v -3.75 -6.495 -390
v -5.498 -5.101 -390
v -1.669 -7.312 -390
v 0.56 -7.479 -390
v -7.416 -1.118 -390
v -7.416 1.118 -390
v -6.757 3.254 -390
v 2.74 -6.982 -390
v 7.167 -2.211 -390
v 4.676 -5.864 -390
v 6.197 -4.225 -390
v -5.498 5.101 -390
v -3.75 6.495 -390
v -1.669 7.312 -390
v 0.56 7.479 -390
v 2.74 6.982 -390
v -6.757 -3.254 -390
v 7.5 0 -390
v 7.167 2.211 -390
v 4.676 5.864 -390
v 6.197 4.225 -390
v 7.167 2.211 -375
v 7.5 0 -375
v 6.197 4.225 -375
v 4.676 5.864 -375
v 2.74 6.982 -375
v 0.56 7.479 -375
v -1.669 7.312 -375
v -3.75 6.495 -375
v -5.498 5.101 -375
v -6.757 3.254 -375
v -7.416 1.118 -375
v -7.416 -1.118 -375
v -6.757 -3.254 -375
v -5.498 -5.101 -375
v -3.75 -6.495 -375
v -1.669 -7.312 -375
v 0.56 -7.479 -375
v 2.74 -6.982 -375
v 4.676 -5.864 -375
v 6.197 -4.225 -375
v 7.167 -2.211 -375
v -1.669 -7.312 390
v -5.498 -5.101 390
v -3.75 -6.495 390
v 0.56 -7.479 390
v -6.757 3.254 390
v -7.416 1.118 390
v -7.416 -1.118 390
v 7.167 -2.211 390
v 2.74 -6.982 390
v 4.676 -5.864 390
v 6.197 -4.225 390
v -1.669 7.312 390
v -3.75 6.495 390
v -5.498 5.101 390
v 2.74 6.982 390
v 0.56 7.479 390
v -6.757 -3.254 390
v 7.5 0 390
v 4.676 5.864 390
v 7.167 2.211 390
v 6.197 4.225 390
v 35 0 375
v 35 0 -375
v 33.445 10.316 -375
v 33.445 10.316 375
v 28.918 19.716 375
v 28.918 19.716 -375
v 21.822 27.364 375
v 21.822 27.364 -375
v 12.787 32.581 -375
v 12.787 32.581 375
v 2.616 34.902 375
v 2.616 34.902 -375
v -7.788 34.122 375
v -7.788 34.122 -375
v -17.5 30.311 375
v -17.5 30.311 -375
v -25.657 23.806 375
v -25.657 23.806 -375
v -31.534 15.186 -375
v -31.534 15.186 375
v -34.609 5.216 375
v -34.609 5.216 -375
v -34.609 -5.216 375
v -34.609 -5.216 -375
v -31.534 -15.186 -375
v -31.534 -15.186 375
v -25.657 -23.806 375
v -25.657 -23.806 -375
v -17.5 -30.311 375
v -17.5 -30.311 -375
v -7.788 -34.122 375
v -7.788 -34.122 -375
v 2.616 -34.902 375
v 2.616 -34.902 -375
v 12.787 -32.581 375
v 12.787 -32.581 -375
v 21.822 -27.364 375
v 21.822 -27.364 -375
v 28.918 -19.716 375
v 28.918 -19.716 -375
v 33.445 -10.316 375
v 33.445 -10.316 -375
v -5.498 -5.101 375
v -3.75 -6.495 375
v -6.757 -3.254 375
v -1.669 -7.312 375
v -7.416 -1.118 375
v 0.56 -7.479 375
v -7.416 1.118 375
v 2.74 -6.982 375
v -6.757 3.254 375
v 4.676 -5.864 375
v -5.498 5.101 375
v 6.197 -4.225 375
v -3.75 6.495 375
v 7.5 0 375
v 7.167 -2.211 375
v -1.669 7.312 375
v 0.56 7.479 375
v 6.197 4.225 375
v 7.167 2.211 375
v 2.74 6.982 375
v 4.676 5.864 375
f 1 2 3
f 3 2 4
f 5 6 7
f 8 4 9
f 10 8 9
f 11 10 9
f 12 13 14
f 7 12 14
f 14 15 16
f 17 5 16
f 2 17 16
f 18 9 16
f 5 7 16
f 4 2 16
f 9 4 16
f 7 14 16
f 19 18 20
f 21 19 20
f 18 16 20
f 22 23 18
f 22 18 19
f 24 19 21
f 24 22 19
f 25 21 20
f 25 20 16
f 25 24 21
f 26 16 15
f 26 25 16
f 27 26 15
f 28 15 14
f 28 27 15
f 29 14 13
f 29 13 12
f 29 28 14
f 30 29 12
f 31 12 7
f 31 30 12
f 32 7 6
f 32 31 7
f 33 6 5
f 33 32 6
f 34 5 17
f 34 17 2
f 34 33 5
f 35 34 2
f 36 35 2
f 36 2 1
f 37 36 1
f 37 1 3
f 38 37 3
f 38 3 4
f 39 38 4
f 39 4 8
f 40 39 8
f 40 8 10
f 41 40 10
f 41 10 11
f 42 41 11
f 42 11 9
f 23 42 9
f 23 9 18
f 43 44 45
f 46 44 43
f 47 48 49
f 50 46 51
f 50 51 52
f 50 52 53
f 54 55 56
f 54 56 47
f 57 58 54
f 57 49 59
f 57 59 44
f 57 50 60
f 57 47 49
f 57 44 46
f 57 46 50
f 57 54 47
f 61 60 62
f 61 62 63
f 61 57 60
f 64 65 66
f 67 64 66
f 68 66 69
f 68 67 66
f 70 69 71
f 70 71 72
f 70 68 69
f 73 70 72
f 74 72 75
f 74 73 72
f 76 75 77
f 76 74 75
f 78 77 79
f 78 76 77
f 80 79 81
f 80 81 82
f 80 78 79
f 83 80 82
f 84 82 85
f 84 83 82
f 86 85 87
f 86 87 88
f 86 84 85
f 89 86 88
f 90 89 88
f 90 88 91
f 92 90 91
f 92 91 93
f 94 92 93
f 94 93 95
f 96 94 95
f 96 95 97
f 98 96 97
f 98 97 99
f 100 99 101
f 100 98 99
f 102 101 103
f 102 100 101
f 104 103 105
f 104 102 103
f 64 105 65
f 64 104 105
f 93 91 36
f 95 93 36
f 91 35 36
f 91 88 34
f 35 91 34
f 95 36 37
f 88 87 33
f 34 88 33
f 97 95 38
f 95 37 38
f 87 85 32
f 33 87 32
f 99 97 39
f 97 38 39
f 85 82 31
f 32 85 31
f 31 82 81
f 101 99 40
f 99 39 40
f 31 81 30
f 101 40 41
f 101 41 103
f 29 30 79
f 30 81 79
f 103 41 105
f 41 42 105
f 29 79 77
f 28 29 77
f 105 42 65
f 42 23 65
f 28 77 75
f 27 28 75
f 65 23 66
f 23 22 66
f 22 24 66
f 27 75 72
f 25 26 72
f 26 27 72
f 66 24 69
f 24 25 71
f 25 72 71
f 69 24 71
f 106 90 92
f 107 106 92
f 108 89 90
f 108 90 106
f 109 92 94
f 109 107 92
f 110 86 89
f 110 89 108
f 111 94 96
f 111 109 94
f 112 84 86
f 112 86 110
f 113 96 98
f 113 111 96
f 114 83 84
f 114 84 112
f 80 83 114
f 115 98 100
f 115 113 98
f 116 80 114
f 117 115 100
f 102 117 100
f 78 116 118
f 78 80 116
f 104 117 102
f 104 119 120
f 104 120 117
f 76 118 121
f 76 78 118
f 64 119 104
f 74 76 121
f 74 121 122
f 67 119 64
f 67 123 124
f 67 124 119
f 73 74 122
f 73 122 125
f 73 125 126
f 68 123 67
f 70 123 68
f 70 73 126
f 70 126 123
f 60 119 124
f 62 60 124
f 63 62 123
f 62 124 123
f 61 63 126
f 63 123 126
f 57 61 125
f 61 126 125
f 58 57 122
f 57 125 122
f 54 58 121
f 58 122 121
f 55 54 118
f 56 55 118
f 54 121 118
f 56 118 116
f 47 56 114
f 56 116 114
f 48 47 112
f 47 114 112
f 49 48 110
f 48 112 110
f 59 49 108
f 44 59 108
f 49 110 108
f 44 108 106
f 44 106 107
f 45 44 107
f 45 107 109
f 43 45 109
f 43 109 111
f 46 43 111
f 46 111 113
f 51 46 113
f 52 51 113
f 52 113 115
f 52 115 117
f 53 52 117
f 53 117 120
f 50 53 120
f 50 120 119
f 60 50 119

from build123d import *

# Parameters (mm, degrees)
CYLINDER_R        = 35
CYLINDER_DEPTH    = 375
CYLINDER001_R     = 7.5
CYLINDER001_DEPTH = 390


with BuildPart() as part:
    # Cylinder → Cylinder (join)
    with BuildSketch(Plane.XY):
        Circle(CYLINDER_R)
    cylinder = extrude(amount=CYLINDER_DEPTH)

    # Cylinder001 → Cylinder001 (join)
    with BuildSketch(Plane.XY):
        Circle(CYLINDER001_R)
    cylinder001 = extrude(amount=CYLINDER001_DEPTH)

    # Mirrored001: Cylinder, Cylinder001 across XY
    add(cylinder.mirror(Plane.XY))
    add(cylinder001.mirror(Plane.XY))


solid = part.part
